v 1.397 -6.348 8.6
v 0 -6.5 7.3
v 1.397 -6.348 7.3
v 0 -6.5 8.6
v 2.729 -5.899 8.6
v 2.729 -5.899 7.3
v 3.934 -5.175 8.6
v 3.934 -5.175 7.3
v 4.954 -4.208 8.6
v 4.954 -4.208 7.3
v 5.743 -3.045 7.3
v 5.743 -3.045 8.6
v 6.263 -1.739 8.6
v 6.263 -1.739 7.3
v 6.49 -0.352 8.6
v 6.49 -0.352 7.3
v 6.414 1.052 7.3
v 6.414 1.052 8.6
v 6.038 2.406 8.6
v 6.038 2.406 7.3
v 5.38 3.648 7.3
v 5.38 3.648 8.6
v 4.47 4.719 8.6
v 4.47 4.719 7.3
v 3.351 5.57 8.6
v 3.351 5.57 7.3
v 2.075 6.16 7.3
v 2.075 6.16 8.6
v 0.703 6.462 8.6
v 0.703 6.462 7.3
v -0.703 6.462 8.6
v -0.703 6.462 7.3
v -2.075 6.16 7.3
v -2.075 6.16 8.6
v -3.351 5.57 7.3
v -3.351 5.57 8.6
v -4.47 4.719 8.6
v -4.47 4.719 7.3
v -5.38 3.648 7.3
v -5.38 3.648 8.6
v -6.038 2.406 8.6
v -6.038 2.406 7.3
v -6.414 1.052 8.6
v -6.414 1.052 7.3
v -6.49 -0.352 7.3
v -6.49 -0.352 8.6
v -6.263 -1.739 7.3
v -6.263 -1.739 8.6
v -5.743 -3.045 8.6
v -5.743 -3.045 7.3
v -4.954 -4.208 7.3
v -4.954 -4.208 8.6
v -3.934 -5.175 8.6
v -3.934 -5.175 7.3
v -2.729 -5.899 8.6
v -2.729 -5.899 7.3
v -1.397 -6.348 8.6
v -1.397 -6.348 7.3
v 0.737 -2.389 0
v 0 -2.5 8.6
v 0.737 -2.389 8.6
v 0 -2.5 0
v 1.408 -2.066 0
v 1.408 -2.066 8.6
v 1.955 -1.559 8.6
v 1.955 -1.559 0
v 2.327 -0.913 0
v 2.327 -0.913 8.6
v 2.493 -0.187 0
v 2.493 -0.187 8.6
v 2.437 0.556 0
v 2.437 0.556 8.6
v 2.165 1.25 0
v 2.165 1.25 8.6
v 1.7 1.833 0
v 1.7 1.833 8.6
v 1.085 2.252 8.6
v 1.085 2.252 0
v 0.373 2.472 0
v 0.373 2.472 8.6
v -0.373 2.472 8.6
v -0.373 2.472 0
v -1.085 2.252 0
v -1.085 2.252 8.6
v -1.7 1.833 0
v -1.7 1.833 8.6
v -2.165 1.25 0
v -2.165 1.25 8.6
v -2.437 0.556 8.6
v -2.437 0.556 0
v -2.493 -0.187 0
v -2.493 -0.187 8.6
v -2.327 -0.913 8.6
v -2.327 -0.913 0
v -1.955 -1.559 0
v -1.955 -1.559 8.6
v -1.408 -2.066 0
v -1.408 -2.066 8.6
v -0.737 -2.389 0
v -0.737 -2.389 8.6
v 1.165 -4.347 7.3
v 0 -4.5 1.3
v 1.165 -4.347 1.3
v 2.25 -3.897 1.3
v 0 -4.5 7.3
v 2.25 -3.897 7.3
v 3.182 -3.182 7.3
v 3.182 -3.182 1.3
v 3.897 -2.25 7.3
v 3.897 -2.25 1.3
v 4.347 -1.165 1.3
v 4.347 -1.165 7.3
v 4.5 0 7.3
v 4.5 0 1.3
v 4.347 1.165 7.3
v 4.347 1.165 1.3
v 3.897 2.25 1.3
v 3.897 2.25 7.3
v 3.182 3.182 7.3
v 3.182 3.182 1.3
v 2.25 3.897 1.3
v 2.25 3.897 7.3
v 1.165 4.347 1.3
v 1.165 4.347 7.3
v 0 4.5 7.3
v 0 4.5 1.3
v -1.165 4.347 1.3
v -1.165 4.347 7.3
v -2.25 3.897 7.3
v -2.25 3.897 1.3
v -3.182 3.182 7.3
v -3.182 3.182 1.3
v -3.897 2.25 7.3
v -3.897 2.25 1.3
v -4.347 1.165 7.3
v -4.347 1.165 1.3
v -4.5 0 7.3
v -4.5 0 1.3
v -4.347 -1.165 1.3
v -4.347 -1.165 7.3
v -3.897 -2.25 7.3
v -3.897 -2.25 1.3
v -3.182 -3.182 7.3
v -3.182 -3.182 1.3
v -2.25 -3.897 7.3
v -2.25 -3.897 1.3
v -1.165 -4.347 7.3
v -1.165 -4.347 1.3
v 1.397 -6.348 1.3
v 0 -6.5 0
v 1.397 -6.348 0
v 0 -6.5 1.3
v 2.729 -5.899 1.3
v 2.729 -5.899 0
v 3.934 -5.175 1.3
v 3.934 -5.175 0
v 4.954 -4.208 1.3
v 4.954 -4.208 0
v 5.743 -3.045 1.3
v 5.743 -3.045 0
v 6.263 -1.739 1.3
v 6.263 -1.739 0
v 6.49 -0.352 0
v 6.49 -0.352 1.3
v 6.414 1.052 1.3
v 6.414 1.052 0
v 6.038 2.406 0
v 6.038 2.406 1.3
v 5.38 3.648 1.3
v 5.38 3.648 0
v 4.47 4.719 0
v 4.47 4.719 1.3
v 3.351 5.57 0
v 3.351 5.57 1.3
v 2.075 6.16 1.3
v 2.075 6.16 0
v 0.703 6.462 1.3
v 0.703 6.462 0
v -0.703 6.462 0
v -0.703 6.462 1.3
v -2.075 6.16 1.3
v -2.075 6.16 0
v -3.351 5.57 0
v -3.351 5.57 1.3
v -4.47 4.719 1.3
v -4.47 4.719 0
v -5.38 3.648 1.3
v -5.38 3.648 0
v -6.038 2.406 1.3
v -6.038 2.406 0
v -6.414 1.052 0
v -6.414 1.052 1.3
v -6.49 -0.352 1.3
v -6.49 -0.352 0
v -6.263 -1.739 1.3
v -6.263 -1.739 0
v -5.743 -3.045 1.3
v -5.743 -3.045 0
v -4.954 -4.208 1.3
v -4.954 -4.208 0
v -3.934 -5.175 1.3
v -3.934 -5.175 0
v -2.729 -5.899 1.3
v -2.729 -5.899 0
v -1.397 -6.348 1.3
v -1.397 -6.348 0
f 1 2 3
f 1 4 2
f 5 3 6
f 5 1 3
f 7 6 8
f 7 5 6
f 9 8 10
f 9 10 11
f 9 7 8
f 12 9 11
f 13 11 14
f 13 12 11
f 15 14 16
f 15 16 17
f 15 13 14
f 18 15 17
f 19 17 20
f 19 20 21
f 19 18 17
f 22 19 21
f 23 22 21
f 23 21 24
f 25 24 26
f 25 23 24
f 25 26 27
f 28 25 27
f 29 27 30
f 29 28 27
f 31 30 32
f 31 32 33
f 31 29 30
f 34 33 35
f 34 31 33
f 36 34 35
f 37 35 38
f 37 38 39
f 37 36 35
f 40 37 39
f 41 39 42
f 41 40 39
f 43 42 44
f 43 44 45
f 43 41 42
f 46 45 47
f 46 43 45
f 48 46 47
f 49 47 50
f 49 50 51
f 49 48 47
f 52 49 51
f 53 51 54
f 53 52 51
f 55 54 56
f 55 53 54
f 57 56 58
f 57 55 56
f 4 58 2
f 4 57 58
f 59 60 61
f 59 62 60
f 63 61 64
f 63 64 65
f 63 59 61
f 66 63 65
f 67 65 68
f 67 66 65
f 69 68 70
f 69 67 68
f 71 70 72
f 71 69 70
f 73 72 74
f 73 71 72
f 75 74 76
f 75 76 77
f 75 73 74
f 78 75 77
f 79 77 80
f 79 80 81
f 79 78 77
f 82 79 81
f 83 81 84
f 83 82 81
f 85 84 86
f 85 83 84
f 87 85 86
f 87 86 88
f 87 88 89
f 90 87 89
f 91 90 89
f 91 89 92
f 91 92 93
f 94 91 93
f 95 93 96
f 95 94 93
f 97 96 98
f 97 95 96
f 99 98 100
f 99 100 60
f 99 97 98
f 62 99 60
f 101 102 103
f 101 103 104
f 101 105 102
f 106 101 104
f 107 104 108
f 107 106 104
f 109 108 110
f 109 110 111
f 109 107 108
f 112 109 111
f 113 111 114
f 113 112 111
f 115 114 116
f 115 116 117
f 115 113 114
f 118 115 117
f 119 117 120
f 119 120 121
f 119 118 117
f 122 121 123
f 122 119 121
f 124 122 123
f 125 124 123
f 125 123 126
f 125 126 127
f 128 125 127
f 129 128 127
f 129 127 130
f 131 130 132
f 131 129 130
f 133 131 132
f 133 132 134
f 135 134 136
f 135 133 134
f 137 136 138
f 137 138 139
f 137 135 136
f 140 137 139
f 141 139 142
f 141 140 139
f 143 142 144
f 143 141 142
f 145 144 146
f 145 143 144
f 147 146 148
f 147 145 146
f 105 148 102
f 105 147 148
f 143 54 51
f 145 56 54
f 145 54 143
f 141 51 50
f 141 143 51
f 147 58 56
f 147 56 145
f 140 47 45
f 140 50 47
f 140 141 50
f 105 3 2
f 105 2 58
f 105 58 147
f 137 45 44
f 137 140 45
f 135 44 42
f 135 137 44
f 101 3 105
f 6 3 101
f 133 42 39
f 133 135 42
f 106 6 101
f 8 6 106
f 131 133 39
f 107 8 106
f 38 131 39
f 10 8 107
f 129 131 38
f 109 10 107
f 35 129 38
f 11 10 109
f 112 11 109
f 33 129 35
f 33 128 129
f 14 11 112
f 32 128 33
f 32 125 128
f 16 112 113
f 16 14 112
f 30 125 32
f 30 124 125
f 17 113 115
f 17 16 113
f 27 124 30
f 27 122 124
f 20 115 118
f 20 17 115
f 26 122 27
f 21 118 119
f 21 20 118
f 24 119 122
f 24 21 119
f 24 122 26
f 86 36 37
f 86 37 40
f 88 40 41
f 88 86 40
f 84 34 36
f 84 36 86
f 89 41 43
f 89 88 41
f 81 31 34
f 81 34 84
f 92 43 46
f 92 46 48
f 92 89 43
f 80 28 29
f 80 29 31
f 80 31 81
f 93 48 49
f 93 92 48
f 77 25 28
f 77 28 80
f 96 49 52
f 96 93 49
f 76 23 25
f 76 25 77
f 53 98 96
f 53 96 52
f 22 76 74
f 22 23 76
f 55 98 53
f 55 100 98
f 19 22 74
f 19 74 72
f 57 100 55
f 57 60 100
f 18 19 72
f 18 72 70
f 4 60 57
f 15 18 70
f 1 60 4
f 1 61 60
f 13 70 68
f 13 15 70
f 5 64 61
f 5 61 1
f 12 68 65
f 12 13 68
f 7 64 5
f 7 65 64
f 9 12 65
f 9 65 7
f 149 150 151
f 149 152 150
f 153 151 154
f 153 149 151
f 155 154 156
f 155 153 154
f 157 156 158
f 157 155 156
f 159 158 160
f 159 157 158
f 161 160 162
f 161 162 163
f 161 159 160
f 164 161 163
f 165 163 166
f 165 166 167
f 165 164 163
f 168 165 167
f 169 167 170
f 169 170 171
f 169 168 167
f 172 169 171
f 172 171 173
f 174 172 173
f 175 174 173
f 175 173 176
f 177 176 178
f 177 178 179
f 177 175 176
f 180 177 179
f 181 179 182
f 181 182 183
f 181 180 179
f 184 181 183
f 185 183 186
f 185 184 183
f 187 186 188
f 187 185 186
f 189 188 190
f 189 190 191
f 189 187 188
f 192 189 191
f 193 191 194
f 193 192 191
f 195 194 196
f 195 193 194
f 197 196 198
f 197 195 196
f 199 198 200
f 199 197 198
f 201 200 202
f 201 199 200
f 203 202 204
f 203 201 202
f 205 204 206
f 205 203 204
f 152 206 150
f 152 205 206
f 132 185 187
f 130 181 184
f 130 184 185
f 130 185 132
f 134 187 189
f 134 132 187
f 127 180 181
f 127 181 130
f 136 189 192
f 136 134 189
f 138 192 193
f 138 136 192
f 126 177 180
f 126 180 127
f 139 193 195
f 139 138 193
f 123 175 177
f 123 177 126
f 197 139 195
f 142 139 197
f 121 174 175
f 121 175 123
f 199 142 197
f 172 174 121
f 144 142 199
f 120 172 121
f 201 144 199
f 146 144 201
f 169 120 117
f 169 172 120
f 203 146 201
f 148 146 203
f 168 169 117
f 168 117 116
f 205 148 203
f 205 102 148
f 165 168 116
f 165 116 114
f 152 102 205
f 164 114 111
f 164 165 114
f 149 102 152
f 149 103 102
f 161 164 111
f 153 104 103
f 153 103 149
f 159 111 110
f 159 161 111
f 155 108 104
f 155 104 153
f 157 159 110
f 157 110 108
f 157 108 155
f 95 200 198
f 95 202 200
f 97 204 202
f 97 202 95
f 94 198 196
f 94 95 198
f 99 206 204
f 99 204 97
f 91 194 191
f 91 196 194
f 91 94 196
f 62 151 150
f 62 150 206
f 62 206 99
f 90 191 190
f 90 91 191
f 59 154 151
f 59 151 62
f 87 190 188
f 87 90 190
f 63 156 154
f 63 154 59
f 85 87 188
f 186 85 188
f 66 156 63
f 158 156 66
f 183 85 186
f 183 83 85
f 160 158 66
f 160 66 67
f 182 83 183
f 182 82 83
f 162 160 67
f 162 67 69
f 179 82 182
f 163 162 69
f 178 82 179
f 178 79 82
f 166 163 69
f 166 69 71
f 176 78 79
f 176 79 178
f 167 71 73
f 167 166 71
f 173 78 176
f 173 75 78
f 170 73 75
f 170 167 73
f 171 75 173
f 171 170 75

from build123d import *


with BuildPart() as part:
    # Sketch → Revolution (revolve)
    with BuildSketch(Plane.YZ):
        Polygon((-6.5, 8.6), (-2.5, 8.6), (-2.5, 0), (-6.5, 0), (-6.5, 1.3), (-4.5, 1.3), (-4.5, 7.3), (-6.5, 7.3), align=None)
    revolve(axis=Axis((0, 0, 0), (0, 0, 1)))


solid = part.part
